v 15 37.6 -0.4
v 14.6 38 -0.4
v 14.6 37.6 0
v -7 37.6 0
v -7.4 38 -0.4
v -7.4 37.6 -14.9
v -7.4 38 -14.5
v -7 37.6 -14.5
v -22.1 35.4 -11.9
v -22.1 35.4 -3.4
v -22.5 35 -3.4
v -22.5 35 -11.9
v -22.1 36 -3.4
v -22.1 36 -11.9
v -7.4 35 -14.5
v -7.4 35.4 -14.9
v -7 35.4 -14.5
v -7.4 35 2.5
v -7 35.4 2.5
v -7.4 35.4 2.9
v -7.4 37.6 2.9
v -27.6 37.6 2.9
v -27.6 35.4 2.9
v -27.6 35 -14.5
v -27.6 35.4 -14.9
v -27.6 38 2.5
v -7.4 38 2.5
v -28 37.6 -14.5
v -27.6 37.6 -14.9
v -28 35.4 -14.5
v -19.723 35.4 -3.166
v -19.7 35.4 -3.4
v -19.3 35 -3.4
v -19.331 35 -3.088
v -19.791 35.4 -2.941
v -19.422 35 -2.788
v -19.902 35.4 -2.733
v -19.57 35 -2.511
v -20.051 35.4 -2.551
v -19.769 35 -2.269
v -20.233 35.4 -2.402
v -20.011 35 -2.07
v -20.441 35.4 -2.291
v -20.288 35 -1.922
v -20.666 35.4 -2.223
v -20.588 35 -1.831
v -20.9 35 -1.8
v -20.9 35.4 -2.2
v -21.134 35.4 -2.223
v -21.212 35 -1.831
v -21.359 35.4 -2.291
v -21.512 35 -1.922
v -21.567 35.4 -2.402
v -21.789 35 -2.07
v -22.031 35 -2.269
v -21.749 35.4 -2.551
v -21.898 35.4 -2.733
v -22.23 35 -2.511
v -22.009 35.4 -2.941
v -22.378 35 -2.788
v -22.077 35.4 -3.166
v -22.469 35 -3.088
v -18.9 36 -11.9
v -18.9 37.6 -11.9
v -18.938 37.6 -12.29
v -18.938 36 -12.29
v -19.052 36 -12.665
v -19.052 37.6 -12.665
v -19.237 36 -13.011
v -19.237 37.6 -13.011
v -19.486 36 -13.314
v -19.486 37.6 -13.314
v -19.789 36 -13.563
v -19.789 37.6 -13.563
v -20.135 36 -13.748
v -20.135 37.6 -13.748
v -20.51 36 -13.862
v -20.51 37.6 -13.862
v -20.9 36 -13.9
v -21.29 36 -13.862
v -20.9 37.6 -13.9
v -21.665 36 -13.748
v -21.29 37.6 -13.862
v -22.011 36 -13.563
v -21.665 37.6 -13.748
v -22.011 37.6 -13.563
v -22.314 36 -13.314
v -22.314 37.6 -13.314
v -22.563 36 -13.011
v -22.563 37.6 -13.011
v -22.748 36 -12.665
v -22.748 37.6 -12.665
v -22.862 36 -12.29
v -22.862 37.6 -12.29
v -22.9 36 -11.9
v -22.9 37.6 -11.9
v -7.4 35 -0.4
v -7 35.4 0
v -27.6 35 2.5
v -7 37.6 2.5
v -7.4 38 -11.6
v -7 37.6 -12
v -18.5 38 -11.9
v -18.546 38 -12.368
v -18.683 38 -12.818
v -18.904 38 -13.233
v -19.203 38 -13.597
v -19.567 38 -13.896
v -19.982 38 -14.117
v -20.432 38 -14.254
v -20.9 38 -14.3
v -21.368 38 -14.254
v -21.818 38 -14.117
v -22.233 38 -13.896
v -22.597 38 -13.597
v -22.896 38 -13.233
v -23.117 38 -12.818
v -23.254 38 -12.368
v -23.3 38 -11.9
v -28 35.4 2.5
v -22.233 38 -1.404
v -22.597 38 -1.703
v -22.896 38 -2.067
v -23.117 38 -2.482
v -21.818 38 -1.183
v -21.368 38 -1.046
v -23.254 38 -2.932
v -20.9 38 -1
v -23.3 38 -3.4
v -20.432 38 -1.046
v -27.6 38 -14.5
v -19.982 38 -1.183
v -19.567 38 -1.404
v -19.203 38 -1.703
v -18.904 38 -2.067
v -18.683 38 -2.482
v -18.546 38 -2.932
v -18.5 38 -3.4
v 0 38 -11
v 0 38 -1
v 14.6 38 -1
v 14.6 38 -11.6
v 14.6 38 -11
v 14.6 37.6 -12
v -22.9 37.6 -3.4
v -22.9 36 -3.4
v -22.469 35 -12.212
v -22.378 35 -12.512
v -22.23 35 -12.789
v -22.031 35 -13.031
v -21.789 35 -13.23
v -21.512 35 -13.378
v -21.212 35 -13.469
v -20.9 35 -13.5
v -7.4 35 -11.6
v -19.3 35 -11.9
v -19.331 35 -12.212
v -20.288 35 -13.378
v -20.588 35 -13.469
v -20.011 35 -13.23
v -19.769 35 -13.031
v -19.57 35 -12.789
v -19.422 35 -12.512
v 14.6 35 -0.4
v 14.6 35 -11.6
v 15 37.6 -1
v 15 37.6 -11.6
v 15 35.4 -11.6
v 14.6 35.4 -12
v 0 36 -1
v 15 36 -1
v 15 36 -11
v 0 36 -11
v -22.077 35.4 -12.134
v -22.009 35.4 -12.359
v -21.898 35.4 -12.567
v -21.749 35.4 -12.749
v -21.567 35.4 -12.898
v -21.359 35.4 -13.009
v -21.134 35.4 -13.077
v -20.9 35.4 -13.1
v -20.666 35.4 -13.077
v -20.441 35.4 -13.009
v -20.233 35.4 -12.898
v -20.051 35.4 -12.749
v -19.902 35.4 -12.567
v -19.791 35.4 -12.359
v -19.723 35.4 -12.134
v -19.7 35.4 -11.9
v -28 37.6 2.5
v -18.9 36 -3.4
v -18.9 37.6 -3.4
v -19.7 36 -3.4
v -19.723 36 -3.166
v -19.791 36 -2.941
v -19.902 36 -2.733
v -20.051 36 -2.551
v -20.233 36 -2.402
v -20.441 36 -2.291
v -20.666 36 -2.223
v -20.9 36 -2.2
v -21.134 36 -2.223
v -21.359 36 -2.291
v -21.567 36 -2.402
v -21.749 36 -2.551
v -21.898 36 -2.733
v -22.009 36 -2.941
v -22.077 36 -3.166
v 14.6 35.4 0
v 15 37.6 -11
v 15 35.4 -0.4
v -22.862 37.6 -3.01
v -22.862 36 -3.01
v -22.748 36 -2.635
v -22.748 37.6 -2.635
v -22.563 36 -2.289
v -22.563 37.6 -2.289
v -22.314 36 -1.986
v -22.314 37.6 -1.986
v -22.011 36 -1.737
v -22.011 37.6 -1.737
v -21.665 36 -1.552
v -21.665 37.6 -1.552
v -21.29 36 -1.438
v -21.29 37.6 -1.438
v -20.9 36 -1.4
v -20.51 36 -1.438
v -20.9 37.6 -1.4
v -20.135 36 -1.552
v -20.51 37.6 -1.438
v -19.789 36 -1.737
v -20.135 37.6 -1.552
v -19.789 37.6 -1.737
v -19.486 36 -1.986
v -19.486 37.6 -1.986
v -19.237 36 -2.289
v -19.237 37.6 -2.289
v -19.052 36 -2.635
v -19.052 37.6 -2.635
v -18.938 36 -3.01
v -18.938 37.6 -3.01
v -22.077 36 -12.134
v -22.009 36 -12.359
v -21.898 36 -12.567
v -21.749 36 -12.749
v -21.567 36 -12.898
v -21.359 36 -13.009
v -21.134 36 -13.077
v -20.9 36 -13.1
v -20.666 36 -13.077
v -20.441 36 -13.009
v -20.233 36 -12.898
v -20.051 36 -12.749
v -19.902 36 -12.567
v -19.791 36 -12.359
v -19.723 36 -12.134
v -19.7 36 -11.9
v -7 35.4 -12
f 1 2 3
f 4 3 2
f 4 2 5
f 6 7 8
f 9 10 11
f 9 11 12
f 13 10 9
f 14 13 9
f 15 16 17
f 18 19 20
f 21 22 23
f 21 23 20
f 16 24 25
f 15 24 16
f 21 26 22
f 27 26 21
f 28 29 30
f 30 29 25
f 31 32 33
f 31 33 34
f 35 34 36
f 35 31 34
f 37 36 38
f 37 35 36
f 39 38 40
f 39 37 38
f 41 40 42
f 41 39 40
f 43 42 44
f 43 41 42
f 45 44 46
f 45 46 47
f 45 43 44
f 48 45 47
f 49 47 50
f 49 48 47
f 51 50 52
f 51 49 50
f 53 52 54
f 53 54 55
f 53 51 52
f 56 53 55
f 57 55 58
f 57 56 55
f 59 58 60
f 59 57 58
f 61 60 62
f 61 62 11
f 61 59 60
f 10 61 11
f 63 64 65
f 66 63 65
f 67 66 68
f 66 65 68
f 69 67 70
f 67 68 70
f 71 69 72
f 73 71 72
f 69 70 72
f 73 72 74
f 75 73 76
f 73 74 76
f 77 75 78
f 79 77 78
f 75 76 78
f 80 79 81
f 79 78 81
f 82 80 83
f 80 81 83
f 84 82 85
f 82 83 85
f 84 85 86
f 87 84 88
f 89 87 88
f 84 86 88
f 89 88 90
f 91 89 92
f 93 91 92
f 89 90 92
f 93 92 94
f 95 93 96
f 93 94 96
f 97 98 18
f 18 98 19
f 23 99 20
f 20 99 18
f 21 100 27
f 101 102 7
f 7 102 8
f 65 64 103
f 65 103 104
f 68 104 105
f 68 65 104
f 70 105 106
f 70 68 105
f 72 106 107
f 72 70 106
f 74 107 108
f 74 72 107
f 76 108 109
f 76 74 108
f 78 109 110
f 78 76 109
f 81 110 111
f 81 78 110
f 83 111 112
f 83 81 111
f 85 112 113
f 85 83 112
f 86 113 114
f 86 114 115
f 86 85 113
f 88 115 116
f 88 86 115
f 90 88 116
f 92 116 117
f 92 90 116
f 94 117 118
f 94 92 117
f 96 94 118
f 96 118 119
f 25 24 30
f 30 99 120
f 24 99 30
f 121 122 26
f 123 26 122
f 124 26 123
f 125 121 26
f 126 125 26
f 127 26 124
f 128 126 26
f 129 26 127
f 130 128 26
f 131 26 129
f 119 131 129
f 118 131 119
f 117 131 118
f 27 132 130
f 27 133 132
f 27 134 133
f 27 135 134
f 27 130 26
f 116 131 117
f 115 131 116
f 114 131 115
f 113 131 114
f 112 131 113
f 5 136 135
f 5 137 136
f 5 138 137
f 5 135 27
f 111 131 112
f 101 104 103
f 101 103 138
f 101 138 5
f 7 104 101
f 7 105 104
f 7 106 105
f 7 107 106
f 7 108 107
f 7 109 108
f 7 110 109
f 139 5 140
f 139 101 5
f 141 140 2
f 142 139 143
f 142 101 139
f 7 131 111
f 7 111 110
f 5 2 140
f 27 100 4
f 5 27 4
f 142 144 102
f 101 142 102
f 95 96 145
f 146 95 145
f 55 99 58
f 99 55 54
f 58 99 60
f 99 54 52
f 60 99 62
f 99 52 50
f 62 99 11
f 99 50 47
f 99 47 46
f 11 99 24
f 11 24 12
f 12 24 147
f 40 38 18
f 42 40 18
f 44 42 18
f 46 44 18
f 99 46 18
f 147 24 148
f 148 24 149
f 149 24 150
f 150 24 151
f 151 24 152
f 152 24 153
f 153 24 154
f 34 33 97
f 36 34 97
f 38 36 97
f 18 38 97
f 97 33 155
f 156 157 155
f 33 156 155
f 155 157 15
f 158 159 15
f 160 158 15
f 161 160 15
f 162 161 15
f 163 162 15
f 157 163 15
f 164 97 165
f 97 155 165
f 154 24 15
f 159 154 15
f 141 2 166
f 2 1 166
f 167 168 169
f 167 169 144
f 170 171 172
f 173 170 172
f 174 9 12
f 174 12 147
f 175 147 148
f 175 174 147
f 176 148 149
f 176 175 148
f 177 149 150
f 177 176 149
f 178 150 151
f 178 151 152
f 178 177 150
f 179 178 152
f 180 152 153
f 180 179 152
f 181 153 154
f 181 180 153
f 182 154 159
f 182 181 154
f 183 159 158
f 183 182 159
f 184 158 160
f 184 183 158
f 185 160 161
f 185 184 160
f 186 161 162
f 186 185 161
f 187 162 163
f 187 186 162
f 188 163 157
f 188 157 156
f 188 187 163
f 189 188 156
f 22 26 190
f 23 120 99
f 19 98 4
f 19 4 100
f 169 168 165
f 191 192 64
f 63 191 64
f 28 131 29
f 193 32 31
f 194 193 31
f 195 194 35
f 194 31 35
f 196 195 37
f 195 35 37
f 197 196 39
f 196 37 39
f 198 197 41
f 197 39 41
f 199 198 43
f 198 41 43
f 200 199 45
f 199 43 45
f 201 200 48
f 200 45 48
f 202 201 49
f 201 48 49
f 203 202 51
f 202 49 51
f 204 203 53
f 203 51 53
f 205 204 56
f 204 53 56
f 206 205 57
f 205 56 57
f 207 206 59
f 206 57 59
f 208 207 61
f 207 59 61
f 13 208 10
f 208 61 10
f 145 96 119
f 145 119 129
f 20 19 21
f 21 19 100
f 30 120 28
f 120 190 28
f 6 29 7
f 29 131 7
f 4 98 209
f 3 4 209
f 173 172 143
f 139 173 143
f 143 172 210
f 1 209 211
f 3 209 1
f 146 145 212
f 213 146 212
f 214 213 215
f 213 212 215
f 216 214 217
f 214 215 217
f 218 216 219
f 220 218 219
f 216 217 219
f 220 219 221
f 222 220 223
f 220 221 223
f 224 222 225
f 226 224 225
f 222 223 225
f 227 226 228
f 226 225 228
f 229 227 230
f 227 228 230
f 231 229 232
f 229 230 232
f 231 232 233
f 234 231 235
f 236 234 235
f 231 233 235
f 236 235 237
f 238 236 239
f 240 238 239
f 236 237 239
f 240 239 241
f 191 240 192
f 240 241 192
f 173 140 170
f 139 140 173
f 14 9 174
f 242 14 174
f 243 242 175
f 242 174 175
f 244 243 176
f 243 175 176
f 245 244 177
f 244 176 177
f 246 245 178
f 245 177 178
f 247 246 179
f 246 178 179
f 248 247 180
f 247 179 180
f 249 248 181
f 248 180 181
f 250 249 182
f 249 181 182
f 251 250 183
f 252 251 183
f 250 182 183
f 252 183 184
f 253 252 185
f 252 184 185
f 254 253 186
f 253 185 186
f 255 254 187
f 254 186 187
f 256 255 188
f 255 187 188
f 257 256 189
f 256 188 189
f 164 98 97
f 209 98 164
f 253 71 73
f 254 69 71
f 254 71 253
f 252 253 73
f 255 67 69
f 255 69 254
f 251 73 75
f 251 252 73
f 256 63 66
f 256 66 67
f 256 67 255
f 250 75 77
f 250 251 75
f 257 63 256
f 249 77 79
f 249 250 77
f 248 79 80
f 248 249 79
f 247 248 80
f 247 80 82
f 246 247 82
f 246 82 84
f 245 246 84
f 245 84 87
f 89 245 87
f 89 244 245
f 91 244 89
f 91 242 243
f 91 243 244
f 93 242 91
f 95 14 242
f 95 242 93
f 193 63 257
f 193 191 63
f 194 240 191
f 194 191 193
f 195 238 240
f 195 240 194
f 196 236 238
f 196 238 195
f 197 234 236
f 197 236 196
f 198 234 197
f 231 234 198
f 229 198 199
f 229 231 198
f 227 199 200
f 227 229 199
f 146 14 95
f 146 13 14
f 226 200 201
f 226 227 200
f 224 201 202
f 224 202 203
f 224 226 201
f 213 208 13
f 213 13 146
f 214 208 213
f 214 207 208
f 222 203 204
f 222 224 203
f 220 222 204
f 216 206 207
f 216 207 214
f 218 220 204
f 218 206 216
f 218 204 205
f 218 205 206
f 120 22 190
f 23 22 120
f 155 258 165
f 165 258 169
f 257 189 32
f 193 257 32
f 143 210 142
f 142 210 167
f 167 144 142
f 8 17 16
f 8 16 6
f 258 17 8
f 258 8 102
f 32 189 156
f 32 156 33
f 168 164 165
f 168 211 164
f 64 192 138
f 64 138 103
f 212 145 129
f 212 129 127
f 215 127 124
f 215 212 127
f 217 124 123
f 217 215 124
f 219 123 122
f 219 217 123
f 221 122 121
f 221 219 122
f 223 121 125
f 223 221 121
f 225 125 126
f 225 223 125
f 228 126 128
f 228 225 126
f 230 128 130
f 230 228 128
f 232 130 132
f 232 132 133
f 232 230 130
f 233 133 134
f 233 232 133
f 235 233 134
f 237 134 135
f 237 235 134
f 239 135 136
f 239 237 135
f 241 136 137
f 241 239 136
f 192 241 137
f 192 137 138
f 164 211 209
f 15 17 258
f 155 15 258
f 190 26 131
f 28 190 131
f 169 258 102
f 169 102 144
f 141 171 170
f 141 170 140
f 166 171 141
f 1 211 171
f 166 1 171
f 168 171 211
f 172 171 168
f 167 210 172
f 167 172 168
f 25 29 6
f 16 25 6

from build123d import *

# Parameters (mm, degrees)
SKETCH1_W           = 43
SKETCH1_H           = 17.8
BOSS_EXTRUDE1_DEPTH = 3
SKETCH2_W           = 22
SKETCH2_H           = 2.9
CUT_EXTRUDE1_DEPTH  = 4
SKETCH3_W           = 22
SKETCH3_H           = 2.9
CUT_EXTRUDE2_DEPTH  = 4
CUT_EXTRUDE3_DEPTH  = 2
CUT_EXTRUDE4_DEPTH  = 4
SKETCH6_W           = 10
SKETCH6_H           = 2
CUT_EXTRUDE5_DEPTH  = 15
CHAMFER1_SIZE       = 0.4


with BuildPart() as part:
    # Sketch1 → Boss-Extrude1 (new body)
    with BuildSketch(Plane(origin=(0, 38, 0), x_dir=(1, 0, 0), z_dir=(0, 1, 0))):
        with Locations((-6.5, 6)):
            Rectangle(SKETCH1_W, SKETCH1_H)
    extrude(amount=-BOSS_EXTRUDE1_DEPTH)

    # Sketch2 → Cut-Extrude1 (cut, through all)
    with BuildSketch(Plane.XZ.offset(-35)):
        with Locations((4, 1.45)):
            Rectangle(SKETCH2_W, SKETCH2_H)
    extrude(amount=-CUT_EXTRUDE1_DEPTH, mode=Mode.SUBTRACT)

    # Sketch3 → Cut-Extrude2 (cut, through all)
    with BuildSketch(Plane.XZ.offset(-35)):
        with Locations((4, -13.45)):
            Rectangle(SKETCH3_W, SKETCH3_H)
    extrude(amount=-CUT_EXTRUDE2_DEPTH, mode=Mode.SUBTRACT)

    # Sketch4 → Cut-Extrude3 (cut)
    with BuildSketch(Plane(origin=(0, 38, 0), x_dir=(-1, 0, 0), z_dir=(0, 1, 0))):
        with BuildLine():
            Line((22.9, -11.9), (22.9, -3.4))
            ThreePointArc((22.9, -3.4), (20.9, -1.4), (18.9, -3.4))
            Line((18.9, -3.4), (18.9, -11.9))
            ThreePointArc((18.9, -11.9), (20.9, -13.9), (22.9, -11.9))
        make_face()
    extrude(amount=-CUT_EXTRUDE3_DEPTH, mode=Mode.SUBTRACT)

    # Sketch5 → Cut-Extrude4 (cut, through all)
    with BuildSketch(Plane.XZ.offset(-35)):
        with BuildLine():
            Line((-22.1, -3.4), (-22.1, -11.9))
            ThreePointArc((-22.1, -11.9), (-20.9, -13.1), (-19.7, -11.9))
            Line((-19.7, -11.9), (-19.7, -3.4))
            ThreePointArc((-19.7, -3.4), (-20.9, -2.2), (-22.1, -3.4))
        make_face()
    extrude(amount=-CUT_EXTRUDE4_DEPTH, mode=Mode.SUBTRACT)

    # Sketch6 → Cut-Extrude5 (cut)
    with BuildSketch(Plane(origin=(15, 0, 0), x_dir=(0, 0, -1), z_dir=(1, 0, 0))):
        with Locations((6, 37)):
            Rectangle(SKETCH6_W, SKETCH6_H)
    extrude(amount=-CUT_EXTRUDE5_DEPTH, mode=Mode.SUBTRACT)

    # Chamfer1
    chamfer1_edges = [part.edges().sort_by_distance(p)[0] for p in [
        (15, 38, -0.5),
        (15, 35, -6),
        (-7, 36.5, 2.9),
        (4, 38, 0),
        (15, 36.5, 0),
        (-7, 38, 1.45),
        (-7, 35, 1.45),
        (4, 35, 0),
        (-17.5, 38, -14.9),
        (-17.5, 35, -14.9),
        (15, 36.5, -12),
        (-7, 38, -13.45),
        (-7, 36.5, -14.9),
        (4, 38, -12),
        (4, 35, -12),
        (-7, 35, -13.45),
        (-20.9, 38, -13.9),
        (-22.9, 38, -7.65),
        (-20.9, 38, -1.4),
        (-28, 35, -6),
        (-18.9, 38, -7.65),
        (-17.5, 38, 2.9),
        (-28, 38, -6),
        (-20.9, 35, -2.2),
        (-22.1, 35, -7.65),
        (-20.9, 35, -13.1),
        (-19.7, 35, -7.65),
        (-28, 36.5, -14.9),
        (15, 38, -11.5),
        (-28, 36.5, 2.9),
        (-17.5, 35, 2.9),
    ]]
    chamfer(chamfer1_edges, length=CHAMFER1_SIZE)


solid = part.part
